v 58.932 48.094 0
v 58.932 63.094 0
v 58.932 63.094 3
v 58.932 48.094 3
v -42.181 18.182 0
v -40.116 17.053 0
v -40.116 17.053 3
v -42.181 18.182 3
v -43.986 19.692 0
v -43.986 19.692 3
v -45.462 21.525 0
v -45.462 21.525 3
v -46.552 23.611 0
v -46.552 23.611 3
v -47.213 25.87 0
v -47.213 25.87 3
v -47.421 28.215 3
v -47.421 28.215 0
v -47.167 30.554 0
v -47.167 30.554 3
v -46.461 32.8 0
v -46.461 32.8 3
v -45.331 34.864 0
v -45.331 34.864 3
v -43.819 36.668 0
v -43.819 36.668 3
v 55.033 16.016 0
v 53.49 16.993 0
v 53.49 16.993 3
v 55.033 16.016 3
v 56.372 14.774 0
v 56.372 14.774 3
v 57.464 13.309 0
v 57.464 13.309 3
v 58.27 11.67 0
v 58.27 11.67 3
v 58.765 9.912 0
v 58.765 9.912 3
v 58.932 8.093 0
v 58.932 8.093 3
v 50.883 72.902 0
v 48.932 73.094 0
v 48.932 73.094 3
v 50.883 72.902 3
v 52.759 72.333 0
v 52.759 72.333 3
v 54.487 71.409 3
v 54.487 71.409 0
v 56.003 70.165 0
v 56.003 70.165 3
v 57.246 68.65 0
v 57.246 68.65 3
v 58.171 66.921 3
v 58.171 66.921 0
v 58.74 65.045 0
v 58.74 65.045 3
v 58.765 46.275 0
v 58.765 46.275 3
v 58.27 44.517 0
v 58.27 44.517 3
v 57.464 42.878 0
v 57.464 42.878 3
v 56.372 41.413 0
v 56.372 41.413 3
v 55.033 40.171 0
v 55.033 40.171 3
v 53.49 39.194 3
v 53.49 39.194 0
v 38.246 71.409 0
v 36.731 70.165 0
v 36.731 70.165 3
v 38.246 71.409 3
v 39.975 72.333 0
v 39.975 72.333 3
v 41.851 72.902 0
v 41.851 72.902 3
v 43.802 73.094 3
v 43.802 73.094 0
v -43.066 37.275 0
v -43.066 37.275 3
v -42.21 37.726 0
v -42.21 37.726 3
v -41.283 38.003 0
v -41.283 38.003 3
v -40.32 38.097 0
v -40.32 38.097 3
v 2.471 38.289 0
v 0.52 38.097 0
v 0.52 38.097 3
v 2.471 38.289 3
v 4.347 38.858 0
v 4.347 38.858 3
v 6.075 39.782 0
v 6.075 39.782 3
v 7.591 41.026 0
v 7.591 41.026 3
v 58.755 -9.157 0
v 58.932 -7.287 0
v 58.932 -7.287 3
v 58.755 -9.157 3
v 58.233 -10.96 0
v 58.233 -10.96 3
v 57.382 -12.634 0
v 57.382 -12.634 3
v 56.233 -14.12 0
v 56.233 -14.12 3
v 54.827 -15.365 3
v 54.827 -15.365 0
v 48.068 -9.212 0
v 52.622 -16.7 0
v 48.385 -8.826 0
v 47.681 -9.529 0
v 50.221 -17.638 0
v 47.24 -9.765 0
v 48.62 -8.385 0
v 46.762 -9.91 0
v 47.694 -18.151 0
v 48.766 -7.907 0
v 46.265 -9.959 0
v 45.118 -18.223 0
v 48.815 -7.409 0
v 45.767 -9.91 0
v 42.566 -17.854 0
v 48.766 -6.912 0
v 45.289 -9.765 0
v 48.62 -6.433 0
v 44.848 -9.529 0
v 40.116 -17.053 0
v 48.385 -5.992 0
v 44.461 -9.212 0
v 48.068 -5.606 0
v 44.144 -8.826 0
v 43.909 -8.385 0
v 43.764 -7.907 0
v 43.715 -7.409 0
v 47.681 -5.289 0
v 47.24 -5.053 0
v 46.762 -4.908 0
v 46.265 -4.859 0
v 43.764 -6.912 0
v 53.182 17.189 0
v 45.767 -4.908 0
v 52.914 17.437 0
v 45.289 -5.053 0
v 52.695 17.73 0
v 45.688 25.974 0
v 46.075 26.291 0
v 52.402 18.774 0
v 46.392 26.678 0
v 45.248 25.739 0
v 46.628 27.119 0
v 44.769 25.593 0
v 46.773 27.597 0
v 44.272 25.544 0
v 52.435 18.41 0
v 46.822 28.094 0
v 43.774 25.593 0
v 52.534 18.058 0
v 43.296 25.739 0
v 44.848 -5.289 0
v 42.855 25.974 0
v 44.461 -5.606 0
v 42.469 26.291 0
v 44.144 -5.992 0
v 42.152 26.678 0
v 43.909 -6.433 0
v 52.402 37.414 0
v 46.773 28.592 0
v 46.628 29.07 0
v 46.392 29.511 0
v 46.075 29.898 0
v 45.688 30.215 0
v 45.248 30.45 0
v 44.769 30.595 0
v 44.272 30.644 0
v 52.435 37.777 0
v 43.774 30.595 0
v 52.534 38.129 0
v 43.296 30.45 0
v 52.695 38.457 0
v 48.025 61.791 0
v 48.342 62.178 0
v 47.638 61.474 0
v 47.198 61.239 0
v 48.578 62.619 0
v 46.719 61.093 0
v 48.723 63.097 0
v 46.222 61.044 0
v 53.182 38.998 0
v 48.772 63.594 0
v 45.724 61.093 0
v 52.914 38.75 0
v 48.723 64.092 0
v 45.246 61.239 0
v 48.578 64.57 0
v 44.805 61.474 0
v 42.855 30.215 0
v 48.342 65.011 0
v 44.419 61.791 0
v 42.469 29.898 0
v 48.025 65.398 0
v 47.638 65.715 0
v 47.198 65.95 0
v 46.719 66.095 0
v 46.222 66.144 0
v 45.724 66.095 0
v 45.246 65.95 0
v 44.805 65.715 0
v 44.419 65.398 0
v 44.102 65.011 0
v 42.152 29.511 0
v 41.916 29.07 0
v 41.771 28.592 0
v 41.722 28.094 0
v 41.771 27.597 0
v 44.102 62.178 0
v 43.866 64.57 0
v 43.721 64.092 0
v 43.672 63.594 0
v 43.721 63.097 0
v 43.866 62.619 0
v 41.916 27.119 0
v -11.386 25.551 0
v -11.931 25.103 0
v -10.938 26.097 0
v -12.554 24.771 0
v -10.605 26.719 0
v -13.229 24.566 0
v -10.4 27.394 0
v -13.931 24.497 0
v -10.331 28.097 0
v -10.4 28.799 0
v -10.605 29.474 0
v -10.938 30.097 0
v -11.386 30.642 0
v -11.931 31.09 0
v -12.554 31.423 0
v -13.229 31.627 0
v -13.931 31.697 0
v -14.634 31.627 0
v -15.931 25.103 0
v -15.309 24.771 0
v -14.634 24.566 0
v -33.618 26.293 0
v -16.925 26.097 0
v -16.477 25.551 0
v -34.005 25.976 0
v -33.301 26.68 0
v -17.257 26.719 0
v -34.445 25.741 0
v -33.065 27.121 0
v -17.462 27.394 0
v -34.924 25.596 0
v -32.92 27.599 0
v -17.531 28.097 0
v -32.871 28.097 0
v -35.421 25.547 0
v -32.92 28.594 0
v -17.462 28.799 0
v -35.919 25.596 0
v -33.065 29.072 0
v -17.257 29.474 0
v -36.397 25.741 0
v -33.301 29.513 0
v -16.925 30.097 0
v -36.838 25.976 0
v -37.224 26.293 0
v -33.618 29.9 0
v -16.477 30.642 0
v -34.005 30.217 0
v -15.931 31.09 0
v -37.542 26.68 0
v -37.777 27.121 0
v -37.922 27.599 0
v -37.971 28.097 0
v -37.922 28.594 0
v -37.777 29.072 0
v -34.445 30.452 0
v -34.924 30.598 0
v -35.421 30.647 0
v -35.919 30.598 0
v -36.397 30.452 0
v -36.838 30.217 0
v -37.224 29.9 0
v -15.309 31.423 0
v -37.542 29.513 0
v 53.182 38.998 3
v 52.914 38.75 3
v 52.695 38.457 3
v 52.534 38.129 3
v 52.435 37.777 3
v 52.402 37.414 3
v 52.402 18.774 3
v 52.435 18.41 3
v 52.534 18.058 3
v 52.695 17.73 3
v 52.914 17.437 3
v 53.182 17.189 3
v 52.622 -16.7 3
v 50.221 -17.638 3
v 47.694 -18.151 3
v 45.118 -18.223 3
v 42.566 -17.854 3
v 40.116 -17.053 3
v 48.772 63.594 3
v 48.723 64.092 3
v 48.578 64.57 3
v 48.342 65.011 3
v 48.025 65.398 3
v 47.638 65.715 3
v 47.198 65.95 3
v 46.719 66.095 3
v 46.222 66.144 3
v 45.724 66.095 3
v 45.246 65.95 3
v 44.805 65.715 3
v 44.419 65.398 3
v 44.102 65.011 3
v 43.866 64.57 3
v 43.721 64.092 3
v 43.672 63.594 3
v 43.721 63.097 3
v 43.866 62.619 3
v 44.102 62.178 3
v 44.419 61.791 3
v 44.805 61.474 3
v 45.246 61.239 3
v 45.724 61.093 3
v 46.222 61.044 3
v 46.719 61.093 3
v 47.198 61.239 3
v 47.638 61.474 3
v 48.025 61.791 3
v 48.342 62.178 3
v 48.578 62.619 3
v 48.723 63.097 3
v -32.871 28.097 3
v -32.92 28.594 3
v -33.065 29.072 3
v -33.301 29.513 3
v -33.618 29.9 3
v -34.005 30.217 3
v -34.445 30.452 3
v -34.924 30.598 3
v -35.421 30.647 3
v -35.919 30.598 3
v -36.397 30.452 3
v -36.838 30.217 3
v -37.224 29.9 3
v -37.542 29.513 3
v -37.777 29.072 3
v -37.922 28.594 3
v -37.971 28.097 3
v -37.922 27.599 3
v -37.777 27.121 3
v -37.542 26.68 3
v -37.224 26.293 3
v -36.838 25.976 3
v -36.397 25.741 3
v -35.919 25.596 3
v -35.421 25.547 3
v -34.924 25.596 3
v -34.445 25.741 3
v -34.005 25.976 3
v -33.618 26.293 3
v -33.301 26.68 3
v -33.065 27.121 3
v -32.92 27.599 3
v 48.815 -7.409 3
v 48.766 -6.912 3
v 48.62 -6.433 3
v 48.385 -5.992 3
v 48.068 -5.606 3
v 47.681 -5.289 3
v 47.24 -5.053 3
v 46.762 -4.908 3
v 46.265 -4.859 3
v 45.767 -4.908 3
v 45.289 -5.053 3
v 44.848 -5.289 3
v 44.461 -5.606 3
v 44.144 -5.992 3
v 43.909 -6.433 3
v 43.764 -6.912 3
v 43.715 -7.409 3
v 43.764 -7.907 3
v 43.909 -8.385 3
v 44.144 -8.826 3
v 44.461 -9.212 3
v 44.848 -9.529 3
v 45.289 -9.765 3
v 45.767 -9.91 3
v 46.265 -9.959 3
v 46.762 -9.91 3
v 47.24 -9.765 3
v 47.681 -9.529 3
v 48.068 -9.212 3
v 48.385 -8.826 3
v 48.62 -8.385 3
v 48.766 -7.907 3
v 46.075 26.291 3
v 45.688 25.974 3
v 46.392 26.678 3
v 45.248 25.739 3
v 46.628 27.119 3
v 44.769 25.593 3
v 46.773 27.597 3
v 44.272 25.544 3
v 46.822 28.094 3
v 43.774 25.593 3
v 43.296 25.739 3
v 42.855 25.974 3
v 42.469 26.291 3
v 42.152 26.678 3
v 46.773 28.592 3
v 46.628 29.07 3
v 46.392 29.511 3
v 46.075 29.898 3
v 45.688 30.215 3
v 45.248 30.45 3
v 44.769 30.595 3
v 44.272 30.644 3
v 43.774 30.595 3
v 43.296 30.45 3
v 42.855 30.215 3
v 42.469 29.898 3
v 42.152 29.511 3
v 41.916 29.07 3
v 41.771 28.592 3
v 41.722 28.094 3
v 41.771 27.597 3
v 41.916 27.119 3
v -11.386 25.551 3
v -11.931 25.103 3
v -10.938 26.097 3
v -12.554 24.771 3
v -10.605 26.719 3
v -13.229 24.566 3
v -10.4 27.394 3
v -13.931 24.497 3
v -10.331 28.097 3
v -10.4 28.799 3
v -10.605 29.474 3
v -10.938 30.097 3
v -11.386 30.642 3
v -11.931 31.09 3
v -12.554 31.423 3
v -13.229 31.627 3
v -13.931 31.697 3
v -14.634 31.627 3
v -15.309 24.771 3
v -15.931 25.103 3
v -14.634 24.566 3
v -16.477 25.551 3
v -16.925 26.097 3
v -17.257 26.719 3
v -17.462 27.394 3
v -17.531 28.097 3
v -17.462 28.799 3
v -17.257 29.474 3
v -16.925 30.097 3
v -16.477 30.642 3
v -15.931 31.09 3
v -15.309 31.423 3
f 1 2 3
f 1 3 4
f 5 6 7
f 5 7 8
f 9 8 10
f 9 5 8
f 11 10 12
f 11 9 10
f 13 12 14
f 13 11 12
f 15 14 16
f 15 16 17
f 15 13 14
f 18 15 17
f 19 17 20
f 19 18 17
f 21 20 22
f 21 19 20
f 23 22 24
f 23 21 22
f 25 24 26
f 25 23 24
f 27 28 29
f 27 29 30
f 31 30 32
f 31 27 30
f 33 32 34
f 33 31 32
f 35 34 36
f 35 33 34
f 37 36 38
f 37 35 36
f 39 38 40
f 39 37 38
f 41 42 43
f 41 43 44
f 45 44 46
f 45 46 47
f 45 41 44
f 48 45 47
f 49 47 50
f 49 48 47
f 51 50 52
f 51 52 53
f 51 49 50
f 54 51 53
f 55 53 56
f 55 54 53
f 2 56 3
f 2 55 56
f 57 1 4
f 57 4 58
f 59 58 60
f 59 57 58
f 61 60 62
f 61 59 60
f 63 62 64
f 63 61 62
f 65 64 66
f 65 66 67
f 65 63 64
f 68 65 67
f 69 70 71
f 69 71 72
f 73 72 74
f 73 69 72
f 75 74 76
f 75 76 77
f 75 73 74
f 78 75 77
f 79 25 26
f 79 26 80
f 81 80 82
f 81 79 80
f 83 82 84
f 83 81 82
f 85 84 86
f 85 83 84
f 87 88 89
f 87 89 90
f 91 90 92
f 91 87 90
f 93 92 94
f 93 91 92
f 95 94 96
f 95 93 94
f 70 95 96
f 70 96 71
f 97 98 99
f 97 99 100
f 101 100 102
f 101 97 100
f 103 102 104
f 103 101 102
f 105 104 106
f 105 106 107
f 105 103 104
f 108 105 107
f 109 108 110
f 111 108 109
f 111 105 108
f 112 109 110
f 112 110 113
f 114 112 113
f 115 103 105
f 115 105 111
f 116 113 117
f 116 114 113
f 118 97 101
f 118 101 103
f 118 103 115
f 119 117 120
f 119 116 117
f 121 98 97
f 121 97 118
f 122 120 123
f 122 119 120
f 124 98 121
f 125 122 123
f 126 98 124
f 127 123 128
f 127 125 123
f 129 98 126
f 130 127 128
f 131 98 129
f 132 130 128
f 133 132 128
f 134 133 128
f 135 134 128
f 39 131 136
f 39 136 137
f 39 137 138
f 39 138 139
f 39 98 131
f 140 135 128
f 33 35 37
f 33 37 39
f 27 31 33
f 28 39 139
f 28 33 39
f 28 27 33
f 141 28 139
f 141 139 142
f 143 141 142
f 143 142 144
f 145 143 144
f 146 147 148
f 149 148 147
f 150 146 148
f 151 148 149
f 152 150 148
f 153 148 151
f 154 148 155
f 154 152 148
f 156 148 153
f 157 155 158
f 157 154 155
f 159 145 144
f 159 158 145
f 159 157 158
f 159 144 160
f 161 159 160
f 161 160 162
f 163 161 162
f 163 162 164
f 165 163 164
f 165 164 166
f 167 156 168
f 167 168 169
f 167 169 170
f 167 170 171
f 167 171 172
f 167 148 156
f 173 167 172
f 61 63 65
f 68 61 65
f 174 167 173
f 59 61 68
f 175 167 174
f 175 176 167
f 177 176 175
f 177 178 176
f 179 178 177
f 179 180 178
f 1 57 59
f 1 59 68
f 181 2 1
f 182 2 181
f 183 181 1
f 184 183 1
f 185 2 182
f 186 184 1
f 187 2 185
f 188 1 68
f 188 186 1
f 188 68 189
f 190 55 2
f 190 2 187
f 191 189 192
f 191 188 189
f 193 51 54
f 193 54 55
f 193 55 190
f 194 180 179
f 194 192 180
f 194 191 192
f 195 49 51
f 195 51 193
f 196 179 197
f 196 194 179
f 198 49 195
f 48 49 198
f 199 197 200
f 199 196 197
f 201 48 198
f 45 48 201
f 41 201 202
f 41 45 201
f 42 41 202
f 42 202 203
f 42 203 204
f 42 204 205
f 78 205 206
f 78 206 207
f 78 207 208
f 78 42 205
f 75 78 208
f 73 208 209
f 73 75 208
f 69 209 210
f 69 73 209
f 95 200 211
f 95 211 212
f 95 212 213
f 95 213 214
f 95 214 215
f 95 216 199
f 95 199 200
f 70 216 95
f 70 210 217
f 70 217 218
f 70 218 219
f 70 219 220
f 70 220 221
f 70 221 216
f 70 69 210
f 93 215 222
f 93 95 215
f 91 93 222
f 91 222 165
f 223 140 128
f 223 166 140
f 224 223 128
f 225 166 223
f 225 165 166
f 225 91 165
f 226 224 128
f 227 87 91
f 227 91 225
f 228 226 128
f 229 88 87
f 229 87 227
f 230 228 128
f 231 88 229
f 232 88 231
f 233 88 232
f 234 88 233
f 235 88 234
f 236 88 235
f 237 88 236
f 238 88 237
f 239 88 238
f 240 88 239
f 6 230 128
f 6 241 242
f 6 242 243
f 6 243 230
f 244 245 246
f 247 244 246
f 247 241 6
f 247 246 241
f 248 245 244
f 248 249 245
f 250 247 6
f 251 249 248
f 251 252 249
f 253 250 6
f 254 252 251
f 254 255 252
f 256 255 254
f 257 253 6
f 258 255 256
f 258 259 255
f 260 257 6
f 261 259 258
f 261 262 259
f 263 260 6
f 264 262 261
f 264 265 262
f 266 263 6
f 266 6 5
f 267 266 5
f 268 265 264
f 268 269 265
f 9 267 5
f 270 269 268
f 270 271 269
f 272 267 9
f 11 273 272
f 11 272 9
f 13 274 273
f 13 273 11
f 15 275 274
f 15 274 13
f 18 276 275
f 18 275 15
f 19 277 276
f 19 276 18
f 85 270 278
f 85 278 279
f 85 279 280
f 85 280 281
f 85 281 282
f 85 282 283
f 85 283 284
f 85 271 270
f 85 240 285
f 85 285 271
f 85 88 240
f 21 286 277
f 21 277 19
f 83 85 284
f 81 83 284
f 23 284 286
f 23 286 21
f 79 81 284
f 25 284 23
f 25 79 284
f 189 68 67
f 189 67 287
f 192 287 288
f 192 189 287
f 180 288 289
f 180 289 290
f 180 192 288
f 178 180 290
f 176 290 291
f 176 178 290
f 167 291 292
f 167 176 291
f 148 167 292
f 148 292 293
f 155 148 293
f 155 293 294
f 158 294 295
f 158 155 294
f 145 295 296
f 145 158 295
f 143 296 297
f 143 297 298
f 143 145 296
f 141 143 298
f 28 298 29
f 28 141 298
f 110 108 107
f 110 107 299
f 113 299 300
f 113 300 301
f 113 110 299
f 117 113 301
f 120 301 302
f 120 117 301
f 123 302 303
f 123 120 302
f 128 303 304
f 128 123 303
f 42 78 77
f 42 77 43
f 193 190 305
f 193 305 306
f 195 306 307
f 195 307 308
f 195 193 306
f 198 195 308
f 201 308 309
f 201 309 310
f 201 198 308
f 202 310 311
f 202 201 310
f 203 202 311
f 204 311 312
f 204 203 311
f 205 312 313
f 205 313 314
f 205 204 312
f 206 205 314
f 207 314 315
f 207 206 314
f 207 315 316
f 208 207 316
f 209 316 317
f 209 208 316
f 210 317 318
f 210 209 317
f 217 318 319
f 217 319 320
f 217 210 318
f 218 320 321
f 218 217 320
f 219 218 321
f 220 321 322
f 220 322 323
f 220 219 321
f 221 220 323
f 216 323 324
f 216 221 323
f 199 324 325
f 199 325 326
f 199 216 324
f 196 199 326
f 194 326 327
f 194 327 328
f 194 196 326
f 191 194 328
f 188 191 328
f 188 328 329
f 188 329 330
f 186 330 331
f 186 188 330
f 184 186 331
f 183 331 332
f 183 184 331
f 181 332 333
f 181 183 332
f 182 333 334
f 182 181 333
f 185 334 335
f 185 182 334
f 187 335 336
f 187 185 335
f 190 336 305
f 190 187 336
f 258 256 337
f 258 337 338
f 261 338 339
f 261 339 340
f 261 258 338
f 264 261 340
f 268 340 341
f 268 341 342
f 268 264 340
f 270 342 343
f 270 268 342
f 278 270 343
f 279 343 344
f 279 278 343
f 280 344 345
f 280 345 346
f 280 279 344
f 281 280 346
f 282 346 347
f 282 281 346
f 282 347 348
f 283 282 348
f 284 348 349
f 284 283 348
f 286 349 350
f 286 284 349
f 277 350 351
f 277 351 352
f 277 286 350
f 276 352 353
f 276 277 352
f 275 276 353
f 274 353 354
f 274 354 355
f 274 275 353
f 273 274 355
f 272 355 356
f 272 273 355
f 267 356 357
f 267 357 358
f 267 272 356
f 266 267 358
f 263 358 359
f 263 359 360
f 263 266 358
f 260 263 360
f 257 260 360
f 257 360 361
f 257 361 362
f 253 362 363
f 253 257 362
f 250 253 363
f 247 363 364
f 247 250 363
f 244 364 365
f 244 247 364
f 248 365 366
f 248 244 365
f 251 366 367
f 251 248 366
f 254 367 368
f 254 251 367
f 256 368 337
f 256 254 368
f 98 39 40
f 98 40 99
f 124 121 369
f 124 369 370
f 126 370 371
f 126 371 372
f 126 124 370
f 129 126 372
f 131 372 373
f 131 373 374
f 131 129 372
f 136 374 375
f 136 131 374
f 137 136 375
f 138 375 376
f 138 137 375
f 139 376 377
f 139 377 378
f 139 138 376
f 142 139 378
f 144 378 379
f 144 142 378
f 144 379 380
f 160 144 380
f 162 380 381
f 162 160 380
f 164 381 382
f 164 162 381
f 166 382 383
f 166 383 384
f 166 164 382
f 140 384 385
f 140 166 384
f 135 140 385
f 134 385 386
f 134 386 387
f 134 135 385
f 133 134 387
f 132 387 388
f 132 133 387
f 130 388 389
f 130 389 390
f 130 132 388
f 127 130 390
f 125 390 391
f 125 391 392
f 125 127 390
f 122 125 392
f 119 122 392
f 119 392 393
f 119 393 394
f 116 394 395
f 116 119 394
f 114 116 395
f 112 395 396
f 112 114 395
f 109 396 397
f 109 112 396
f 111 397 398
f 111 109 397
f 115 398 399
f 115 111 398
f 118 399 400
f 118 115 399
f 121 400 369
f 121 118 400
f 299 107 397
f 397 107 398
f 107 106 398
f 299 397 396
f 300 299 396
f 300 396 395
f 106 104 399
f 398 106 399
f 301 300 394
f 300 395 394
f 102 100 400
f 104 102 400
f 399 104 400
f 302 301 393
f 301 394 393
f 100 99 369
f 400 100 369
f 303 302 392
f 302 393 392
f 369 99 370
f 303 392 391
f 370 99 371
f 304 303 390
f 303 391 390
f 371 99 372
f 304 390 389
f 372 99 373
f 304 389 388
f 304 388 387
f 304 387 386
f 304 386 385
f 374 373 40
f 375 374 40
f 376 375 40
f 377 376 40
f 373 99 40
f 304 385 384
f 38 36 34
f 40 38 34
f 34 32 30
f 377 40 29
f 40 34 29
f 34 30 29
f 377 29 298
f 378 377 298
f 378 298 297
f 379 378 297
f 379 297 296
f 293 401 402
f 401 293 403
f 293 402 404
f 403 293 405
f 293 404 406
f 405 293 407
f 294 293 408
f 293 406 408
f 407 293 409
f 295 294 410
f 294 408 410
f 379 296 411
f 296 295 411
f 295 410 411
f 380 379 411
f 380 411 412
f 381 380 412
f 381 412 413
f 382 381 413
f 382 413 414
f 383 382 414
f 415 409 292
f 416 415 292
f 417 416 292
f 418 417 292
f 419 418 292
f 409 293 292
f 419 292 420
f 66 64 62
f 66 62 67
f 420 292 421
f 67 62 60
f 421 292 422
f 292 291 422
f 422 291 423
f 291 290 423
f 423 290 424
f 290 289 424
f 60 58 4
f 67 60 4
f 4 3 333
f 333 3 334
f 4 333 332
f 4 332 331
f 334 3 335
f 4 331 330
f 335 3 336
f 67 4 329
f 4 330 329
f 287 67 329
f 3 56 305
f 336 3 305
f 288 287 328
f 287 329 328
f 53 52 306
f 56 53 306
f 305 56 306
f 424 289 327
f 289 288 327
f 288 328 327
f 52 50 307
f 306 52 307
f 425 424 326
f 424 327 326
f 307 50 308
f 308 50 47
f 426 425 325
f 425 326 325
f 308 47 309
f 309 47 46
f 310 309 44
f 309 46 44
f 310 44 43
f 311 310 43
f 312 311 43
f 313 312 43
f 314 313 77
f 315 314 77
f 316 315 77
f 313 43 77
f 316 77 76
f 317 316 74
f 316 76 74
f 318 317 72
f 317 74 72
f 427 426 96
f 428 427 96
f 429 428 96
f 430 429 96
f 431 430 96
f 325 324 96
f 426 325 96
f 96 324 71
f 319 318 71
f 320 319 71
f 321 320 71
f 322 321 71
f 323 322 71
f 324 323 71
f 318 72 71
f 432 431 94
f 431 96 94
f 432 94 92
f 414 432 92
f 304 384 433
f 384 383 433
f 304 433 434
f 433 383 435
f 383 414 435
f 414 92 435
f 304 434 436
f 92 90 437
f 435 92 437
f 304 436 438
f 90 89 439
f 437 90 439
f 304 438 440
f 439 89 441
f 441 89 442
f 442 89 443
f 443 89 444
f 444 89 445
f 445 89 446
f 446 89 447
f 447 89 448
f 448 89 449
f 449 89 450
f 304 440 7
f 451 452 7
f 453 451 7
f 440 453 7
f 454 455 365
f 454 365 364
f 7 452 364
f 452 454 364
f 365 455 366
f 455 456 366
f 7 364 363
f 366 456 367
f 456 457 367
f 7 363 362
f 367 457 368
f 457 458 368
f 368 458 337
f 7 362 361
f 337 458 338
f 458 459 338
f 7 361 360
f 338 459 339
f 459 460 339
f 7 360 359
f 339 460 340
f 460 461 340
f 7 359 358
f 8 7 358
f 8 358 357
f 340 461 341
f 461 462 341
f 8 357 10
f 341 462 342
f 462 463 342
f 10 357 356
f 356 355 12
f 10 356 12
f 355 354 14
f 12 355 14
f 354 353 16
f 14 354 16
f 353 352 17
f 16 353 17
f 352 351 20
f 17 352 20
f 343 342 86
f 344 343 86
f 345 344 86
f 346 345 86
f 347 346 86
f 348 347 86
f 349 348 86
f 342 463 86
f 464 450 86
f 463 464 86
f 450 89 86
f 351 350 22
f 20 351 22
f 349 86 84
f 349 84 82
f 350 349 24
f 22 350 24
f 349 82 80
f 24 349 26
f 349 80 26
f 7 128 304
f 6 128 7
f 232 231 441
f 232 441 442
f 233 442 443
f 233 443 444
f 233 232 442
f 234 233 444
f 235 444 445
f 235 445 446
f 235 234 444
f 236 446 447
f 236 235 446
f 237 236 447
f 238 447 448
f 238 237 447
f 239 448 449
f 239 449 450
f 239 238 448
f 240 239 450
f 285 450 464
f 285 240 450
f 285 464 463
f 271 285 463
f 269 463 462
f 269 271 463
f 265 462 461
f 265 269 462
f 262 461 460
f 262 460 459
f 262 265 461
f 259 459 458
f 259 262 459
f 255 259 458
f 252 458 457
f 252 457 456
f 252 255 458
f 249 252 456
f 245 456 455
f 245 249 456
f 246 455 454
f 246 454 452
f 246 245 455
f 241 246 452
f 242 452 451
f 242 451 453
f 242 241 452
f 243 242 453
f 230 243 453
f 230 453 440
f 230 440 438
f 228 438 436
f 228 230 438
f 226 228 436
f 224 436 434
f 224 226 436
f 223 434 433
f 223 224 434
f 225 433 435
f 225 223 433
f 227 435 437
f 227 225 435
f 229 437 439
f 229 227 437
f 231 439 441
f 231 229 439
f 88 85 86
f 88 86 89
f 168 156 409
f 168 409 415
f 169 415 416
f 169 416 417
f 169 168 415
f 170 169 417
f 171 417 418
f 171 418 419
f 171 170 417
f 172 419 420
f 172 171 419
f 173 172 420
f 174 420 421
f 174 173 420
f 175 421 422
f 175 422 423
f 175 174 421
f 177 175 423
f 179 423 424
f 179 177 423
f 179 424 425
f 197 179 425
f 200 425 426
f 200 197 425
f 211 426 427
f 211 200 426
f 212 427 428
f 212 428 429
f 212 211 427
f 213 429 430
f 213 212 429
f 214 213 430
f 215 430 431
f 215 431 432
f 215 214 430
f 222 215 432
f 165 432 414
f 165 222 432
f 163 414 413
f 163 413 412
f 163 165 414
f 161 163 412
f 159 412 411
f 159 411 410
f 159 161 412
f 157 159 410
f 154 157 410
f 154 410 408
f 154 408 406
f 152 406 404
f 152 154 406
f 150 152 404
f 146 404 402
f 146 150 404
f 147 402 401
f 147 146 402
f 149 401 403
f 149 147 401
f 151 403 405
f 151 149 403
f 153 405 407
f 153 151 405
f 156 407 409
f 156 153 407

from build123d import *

# Parameters (mm, degrees)
SKETCH1_R           = 2.55
SKETCH1_R_2         = 3.6
BOSS_EXTRUDE1_DEPTH = 3


with BuildPart() as part:
    # Sketch1 → Boss-Extrude1 (new body)
    with BuildSketch(Plane.XY):
        with BuildLine():
            Line((-40.320217865, 38.096664926), (0.519782135, 38.096664926))
            ThreePointArc((0.519782135, 38.096664926), (4.346616459, 38.857869601), (7.590849947, 41.025597114))
            Line((7.590849947, 41.025597114), (36.7307204, 70.165467567))
            ThreePointArc((36.7307204, 70.165467567), (39.974953888, 72.33319508), (43.801788211, 73.094399755))
            Line((43.801788211, 73.094399755), (48.931788211, 73.094399755))
            ThreePointArc((48.931788211, 73.094399755), (56.002856023, 70.165467567), (58.931788211, 63.094399755))
            Line((58.931788211, 63.094399755), (58.931788211, 48.094399755))
            ThreePointArc((58.931788211, 48.094399755), (57.46359146, 42.87823897), (53.490121545, 39.193748249))
            ThreePointArc((53.490121545, 39.193748249), (52.695427562, 38.456850105), (52.401788211, 37.413617948))
            Line((52.401788211, 37.413617948), (52.401788211, 18.773617948))
            ThreePointArc((52.401788211, 18.773617948), (52.695427562, 17.730385791), (53.490121545, 16.993487647))
            ThreePointArc((53.490121545, 16.993487647), (57.46359146, 13.308996927), (58.931788211, 8.092836142))
            Line((58.931788211, 8.092836142), (58.931788211, -7.287163858))
            ThreePointArc((58.931788211, -7.287163858), (57.846780817, -11.817385358), (54.827206843, -15.364542093))
            ThreePointArc((54.827206843, -15.364542093), (47.694417569, -18.15064712), (40.115883144, -17.052976855))
            Line((40.115883144, -17.052976855), (-40.115883144, 17.052976855))
            ThreePointArc((-40.115883144, 17.052976855), (-47.212985277, 25.870194867), (-43.819425953, 36.668155197))
            ThreePointArc((-43.819425953, 36.668155197), (-42.209999419, 37.725782086), (-40.320217865, 38.096664926))
        make_face()
        with Locations((-35.421326542, 28.096578546)):
            Circle(SKETCH1_R, mode=Mode.SUBTRACT)
        with Locations((-13.931326542, 28.096578546)):
            Circle(SKETCH1_R_2, mode=Mode.SUBTRACT)
        with Locations((46.221788211, 63.594399755)):
            Circle(SKETCH1_R, mode=Mode.SUBTRACT)
        with Locations((44.271788211, 28.094399755)):
            Circle(SKETCH1_R, mode=Mode.SUBTRACT)
        with Locations((46.264570837, -7.409030505)):
            Circle(SKETCH1_R, mode=Mode.SUBTRACT)
    extrude(amount=BOSS_EXTRUDE1_DEPTH)


solid = part.part
